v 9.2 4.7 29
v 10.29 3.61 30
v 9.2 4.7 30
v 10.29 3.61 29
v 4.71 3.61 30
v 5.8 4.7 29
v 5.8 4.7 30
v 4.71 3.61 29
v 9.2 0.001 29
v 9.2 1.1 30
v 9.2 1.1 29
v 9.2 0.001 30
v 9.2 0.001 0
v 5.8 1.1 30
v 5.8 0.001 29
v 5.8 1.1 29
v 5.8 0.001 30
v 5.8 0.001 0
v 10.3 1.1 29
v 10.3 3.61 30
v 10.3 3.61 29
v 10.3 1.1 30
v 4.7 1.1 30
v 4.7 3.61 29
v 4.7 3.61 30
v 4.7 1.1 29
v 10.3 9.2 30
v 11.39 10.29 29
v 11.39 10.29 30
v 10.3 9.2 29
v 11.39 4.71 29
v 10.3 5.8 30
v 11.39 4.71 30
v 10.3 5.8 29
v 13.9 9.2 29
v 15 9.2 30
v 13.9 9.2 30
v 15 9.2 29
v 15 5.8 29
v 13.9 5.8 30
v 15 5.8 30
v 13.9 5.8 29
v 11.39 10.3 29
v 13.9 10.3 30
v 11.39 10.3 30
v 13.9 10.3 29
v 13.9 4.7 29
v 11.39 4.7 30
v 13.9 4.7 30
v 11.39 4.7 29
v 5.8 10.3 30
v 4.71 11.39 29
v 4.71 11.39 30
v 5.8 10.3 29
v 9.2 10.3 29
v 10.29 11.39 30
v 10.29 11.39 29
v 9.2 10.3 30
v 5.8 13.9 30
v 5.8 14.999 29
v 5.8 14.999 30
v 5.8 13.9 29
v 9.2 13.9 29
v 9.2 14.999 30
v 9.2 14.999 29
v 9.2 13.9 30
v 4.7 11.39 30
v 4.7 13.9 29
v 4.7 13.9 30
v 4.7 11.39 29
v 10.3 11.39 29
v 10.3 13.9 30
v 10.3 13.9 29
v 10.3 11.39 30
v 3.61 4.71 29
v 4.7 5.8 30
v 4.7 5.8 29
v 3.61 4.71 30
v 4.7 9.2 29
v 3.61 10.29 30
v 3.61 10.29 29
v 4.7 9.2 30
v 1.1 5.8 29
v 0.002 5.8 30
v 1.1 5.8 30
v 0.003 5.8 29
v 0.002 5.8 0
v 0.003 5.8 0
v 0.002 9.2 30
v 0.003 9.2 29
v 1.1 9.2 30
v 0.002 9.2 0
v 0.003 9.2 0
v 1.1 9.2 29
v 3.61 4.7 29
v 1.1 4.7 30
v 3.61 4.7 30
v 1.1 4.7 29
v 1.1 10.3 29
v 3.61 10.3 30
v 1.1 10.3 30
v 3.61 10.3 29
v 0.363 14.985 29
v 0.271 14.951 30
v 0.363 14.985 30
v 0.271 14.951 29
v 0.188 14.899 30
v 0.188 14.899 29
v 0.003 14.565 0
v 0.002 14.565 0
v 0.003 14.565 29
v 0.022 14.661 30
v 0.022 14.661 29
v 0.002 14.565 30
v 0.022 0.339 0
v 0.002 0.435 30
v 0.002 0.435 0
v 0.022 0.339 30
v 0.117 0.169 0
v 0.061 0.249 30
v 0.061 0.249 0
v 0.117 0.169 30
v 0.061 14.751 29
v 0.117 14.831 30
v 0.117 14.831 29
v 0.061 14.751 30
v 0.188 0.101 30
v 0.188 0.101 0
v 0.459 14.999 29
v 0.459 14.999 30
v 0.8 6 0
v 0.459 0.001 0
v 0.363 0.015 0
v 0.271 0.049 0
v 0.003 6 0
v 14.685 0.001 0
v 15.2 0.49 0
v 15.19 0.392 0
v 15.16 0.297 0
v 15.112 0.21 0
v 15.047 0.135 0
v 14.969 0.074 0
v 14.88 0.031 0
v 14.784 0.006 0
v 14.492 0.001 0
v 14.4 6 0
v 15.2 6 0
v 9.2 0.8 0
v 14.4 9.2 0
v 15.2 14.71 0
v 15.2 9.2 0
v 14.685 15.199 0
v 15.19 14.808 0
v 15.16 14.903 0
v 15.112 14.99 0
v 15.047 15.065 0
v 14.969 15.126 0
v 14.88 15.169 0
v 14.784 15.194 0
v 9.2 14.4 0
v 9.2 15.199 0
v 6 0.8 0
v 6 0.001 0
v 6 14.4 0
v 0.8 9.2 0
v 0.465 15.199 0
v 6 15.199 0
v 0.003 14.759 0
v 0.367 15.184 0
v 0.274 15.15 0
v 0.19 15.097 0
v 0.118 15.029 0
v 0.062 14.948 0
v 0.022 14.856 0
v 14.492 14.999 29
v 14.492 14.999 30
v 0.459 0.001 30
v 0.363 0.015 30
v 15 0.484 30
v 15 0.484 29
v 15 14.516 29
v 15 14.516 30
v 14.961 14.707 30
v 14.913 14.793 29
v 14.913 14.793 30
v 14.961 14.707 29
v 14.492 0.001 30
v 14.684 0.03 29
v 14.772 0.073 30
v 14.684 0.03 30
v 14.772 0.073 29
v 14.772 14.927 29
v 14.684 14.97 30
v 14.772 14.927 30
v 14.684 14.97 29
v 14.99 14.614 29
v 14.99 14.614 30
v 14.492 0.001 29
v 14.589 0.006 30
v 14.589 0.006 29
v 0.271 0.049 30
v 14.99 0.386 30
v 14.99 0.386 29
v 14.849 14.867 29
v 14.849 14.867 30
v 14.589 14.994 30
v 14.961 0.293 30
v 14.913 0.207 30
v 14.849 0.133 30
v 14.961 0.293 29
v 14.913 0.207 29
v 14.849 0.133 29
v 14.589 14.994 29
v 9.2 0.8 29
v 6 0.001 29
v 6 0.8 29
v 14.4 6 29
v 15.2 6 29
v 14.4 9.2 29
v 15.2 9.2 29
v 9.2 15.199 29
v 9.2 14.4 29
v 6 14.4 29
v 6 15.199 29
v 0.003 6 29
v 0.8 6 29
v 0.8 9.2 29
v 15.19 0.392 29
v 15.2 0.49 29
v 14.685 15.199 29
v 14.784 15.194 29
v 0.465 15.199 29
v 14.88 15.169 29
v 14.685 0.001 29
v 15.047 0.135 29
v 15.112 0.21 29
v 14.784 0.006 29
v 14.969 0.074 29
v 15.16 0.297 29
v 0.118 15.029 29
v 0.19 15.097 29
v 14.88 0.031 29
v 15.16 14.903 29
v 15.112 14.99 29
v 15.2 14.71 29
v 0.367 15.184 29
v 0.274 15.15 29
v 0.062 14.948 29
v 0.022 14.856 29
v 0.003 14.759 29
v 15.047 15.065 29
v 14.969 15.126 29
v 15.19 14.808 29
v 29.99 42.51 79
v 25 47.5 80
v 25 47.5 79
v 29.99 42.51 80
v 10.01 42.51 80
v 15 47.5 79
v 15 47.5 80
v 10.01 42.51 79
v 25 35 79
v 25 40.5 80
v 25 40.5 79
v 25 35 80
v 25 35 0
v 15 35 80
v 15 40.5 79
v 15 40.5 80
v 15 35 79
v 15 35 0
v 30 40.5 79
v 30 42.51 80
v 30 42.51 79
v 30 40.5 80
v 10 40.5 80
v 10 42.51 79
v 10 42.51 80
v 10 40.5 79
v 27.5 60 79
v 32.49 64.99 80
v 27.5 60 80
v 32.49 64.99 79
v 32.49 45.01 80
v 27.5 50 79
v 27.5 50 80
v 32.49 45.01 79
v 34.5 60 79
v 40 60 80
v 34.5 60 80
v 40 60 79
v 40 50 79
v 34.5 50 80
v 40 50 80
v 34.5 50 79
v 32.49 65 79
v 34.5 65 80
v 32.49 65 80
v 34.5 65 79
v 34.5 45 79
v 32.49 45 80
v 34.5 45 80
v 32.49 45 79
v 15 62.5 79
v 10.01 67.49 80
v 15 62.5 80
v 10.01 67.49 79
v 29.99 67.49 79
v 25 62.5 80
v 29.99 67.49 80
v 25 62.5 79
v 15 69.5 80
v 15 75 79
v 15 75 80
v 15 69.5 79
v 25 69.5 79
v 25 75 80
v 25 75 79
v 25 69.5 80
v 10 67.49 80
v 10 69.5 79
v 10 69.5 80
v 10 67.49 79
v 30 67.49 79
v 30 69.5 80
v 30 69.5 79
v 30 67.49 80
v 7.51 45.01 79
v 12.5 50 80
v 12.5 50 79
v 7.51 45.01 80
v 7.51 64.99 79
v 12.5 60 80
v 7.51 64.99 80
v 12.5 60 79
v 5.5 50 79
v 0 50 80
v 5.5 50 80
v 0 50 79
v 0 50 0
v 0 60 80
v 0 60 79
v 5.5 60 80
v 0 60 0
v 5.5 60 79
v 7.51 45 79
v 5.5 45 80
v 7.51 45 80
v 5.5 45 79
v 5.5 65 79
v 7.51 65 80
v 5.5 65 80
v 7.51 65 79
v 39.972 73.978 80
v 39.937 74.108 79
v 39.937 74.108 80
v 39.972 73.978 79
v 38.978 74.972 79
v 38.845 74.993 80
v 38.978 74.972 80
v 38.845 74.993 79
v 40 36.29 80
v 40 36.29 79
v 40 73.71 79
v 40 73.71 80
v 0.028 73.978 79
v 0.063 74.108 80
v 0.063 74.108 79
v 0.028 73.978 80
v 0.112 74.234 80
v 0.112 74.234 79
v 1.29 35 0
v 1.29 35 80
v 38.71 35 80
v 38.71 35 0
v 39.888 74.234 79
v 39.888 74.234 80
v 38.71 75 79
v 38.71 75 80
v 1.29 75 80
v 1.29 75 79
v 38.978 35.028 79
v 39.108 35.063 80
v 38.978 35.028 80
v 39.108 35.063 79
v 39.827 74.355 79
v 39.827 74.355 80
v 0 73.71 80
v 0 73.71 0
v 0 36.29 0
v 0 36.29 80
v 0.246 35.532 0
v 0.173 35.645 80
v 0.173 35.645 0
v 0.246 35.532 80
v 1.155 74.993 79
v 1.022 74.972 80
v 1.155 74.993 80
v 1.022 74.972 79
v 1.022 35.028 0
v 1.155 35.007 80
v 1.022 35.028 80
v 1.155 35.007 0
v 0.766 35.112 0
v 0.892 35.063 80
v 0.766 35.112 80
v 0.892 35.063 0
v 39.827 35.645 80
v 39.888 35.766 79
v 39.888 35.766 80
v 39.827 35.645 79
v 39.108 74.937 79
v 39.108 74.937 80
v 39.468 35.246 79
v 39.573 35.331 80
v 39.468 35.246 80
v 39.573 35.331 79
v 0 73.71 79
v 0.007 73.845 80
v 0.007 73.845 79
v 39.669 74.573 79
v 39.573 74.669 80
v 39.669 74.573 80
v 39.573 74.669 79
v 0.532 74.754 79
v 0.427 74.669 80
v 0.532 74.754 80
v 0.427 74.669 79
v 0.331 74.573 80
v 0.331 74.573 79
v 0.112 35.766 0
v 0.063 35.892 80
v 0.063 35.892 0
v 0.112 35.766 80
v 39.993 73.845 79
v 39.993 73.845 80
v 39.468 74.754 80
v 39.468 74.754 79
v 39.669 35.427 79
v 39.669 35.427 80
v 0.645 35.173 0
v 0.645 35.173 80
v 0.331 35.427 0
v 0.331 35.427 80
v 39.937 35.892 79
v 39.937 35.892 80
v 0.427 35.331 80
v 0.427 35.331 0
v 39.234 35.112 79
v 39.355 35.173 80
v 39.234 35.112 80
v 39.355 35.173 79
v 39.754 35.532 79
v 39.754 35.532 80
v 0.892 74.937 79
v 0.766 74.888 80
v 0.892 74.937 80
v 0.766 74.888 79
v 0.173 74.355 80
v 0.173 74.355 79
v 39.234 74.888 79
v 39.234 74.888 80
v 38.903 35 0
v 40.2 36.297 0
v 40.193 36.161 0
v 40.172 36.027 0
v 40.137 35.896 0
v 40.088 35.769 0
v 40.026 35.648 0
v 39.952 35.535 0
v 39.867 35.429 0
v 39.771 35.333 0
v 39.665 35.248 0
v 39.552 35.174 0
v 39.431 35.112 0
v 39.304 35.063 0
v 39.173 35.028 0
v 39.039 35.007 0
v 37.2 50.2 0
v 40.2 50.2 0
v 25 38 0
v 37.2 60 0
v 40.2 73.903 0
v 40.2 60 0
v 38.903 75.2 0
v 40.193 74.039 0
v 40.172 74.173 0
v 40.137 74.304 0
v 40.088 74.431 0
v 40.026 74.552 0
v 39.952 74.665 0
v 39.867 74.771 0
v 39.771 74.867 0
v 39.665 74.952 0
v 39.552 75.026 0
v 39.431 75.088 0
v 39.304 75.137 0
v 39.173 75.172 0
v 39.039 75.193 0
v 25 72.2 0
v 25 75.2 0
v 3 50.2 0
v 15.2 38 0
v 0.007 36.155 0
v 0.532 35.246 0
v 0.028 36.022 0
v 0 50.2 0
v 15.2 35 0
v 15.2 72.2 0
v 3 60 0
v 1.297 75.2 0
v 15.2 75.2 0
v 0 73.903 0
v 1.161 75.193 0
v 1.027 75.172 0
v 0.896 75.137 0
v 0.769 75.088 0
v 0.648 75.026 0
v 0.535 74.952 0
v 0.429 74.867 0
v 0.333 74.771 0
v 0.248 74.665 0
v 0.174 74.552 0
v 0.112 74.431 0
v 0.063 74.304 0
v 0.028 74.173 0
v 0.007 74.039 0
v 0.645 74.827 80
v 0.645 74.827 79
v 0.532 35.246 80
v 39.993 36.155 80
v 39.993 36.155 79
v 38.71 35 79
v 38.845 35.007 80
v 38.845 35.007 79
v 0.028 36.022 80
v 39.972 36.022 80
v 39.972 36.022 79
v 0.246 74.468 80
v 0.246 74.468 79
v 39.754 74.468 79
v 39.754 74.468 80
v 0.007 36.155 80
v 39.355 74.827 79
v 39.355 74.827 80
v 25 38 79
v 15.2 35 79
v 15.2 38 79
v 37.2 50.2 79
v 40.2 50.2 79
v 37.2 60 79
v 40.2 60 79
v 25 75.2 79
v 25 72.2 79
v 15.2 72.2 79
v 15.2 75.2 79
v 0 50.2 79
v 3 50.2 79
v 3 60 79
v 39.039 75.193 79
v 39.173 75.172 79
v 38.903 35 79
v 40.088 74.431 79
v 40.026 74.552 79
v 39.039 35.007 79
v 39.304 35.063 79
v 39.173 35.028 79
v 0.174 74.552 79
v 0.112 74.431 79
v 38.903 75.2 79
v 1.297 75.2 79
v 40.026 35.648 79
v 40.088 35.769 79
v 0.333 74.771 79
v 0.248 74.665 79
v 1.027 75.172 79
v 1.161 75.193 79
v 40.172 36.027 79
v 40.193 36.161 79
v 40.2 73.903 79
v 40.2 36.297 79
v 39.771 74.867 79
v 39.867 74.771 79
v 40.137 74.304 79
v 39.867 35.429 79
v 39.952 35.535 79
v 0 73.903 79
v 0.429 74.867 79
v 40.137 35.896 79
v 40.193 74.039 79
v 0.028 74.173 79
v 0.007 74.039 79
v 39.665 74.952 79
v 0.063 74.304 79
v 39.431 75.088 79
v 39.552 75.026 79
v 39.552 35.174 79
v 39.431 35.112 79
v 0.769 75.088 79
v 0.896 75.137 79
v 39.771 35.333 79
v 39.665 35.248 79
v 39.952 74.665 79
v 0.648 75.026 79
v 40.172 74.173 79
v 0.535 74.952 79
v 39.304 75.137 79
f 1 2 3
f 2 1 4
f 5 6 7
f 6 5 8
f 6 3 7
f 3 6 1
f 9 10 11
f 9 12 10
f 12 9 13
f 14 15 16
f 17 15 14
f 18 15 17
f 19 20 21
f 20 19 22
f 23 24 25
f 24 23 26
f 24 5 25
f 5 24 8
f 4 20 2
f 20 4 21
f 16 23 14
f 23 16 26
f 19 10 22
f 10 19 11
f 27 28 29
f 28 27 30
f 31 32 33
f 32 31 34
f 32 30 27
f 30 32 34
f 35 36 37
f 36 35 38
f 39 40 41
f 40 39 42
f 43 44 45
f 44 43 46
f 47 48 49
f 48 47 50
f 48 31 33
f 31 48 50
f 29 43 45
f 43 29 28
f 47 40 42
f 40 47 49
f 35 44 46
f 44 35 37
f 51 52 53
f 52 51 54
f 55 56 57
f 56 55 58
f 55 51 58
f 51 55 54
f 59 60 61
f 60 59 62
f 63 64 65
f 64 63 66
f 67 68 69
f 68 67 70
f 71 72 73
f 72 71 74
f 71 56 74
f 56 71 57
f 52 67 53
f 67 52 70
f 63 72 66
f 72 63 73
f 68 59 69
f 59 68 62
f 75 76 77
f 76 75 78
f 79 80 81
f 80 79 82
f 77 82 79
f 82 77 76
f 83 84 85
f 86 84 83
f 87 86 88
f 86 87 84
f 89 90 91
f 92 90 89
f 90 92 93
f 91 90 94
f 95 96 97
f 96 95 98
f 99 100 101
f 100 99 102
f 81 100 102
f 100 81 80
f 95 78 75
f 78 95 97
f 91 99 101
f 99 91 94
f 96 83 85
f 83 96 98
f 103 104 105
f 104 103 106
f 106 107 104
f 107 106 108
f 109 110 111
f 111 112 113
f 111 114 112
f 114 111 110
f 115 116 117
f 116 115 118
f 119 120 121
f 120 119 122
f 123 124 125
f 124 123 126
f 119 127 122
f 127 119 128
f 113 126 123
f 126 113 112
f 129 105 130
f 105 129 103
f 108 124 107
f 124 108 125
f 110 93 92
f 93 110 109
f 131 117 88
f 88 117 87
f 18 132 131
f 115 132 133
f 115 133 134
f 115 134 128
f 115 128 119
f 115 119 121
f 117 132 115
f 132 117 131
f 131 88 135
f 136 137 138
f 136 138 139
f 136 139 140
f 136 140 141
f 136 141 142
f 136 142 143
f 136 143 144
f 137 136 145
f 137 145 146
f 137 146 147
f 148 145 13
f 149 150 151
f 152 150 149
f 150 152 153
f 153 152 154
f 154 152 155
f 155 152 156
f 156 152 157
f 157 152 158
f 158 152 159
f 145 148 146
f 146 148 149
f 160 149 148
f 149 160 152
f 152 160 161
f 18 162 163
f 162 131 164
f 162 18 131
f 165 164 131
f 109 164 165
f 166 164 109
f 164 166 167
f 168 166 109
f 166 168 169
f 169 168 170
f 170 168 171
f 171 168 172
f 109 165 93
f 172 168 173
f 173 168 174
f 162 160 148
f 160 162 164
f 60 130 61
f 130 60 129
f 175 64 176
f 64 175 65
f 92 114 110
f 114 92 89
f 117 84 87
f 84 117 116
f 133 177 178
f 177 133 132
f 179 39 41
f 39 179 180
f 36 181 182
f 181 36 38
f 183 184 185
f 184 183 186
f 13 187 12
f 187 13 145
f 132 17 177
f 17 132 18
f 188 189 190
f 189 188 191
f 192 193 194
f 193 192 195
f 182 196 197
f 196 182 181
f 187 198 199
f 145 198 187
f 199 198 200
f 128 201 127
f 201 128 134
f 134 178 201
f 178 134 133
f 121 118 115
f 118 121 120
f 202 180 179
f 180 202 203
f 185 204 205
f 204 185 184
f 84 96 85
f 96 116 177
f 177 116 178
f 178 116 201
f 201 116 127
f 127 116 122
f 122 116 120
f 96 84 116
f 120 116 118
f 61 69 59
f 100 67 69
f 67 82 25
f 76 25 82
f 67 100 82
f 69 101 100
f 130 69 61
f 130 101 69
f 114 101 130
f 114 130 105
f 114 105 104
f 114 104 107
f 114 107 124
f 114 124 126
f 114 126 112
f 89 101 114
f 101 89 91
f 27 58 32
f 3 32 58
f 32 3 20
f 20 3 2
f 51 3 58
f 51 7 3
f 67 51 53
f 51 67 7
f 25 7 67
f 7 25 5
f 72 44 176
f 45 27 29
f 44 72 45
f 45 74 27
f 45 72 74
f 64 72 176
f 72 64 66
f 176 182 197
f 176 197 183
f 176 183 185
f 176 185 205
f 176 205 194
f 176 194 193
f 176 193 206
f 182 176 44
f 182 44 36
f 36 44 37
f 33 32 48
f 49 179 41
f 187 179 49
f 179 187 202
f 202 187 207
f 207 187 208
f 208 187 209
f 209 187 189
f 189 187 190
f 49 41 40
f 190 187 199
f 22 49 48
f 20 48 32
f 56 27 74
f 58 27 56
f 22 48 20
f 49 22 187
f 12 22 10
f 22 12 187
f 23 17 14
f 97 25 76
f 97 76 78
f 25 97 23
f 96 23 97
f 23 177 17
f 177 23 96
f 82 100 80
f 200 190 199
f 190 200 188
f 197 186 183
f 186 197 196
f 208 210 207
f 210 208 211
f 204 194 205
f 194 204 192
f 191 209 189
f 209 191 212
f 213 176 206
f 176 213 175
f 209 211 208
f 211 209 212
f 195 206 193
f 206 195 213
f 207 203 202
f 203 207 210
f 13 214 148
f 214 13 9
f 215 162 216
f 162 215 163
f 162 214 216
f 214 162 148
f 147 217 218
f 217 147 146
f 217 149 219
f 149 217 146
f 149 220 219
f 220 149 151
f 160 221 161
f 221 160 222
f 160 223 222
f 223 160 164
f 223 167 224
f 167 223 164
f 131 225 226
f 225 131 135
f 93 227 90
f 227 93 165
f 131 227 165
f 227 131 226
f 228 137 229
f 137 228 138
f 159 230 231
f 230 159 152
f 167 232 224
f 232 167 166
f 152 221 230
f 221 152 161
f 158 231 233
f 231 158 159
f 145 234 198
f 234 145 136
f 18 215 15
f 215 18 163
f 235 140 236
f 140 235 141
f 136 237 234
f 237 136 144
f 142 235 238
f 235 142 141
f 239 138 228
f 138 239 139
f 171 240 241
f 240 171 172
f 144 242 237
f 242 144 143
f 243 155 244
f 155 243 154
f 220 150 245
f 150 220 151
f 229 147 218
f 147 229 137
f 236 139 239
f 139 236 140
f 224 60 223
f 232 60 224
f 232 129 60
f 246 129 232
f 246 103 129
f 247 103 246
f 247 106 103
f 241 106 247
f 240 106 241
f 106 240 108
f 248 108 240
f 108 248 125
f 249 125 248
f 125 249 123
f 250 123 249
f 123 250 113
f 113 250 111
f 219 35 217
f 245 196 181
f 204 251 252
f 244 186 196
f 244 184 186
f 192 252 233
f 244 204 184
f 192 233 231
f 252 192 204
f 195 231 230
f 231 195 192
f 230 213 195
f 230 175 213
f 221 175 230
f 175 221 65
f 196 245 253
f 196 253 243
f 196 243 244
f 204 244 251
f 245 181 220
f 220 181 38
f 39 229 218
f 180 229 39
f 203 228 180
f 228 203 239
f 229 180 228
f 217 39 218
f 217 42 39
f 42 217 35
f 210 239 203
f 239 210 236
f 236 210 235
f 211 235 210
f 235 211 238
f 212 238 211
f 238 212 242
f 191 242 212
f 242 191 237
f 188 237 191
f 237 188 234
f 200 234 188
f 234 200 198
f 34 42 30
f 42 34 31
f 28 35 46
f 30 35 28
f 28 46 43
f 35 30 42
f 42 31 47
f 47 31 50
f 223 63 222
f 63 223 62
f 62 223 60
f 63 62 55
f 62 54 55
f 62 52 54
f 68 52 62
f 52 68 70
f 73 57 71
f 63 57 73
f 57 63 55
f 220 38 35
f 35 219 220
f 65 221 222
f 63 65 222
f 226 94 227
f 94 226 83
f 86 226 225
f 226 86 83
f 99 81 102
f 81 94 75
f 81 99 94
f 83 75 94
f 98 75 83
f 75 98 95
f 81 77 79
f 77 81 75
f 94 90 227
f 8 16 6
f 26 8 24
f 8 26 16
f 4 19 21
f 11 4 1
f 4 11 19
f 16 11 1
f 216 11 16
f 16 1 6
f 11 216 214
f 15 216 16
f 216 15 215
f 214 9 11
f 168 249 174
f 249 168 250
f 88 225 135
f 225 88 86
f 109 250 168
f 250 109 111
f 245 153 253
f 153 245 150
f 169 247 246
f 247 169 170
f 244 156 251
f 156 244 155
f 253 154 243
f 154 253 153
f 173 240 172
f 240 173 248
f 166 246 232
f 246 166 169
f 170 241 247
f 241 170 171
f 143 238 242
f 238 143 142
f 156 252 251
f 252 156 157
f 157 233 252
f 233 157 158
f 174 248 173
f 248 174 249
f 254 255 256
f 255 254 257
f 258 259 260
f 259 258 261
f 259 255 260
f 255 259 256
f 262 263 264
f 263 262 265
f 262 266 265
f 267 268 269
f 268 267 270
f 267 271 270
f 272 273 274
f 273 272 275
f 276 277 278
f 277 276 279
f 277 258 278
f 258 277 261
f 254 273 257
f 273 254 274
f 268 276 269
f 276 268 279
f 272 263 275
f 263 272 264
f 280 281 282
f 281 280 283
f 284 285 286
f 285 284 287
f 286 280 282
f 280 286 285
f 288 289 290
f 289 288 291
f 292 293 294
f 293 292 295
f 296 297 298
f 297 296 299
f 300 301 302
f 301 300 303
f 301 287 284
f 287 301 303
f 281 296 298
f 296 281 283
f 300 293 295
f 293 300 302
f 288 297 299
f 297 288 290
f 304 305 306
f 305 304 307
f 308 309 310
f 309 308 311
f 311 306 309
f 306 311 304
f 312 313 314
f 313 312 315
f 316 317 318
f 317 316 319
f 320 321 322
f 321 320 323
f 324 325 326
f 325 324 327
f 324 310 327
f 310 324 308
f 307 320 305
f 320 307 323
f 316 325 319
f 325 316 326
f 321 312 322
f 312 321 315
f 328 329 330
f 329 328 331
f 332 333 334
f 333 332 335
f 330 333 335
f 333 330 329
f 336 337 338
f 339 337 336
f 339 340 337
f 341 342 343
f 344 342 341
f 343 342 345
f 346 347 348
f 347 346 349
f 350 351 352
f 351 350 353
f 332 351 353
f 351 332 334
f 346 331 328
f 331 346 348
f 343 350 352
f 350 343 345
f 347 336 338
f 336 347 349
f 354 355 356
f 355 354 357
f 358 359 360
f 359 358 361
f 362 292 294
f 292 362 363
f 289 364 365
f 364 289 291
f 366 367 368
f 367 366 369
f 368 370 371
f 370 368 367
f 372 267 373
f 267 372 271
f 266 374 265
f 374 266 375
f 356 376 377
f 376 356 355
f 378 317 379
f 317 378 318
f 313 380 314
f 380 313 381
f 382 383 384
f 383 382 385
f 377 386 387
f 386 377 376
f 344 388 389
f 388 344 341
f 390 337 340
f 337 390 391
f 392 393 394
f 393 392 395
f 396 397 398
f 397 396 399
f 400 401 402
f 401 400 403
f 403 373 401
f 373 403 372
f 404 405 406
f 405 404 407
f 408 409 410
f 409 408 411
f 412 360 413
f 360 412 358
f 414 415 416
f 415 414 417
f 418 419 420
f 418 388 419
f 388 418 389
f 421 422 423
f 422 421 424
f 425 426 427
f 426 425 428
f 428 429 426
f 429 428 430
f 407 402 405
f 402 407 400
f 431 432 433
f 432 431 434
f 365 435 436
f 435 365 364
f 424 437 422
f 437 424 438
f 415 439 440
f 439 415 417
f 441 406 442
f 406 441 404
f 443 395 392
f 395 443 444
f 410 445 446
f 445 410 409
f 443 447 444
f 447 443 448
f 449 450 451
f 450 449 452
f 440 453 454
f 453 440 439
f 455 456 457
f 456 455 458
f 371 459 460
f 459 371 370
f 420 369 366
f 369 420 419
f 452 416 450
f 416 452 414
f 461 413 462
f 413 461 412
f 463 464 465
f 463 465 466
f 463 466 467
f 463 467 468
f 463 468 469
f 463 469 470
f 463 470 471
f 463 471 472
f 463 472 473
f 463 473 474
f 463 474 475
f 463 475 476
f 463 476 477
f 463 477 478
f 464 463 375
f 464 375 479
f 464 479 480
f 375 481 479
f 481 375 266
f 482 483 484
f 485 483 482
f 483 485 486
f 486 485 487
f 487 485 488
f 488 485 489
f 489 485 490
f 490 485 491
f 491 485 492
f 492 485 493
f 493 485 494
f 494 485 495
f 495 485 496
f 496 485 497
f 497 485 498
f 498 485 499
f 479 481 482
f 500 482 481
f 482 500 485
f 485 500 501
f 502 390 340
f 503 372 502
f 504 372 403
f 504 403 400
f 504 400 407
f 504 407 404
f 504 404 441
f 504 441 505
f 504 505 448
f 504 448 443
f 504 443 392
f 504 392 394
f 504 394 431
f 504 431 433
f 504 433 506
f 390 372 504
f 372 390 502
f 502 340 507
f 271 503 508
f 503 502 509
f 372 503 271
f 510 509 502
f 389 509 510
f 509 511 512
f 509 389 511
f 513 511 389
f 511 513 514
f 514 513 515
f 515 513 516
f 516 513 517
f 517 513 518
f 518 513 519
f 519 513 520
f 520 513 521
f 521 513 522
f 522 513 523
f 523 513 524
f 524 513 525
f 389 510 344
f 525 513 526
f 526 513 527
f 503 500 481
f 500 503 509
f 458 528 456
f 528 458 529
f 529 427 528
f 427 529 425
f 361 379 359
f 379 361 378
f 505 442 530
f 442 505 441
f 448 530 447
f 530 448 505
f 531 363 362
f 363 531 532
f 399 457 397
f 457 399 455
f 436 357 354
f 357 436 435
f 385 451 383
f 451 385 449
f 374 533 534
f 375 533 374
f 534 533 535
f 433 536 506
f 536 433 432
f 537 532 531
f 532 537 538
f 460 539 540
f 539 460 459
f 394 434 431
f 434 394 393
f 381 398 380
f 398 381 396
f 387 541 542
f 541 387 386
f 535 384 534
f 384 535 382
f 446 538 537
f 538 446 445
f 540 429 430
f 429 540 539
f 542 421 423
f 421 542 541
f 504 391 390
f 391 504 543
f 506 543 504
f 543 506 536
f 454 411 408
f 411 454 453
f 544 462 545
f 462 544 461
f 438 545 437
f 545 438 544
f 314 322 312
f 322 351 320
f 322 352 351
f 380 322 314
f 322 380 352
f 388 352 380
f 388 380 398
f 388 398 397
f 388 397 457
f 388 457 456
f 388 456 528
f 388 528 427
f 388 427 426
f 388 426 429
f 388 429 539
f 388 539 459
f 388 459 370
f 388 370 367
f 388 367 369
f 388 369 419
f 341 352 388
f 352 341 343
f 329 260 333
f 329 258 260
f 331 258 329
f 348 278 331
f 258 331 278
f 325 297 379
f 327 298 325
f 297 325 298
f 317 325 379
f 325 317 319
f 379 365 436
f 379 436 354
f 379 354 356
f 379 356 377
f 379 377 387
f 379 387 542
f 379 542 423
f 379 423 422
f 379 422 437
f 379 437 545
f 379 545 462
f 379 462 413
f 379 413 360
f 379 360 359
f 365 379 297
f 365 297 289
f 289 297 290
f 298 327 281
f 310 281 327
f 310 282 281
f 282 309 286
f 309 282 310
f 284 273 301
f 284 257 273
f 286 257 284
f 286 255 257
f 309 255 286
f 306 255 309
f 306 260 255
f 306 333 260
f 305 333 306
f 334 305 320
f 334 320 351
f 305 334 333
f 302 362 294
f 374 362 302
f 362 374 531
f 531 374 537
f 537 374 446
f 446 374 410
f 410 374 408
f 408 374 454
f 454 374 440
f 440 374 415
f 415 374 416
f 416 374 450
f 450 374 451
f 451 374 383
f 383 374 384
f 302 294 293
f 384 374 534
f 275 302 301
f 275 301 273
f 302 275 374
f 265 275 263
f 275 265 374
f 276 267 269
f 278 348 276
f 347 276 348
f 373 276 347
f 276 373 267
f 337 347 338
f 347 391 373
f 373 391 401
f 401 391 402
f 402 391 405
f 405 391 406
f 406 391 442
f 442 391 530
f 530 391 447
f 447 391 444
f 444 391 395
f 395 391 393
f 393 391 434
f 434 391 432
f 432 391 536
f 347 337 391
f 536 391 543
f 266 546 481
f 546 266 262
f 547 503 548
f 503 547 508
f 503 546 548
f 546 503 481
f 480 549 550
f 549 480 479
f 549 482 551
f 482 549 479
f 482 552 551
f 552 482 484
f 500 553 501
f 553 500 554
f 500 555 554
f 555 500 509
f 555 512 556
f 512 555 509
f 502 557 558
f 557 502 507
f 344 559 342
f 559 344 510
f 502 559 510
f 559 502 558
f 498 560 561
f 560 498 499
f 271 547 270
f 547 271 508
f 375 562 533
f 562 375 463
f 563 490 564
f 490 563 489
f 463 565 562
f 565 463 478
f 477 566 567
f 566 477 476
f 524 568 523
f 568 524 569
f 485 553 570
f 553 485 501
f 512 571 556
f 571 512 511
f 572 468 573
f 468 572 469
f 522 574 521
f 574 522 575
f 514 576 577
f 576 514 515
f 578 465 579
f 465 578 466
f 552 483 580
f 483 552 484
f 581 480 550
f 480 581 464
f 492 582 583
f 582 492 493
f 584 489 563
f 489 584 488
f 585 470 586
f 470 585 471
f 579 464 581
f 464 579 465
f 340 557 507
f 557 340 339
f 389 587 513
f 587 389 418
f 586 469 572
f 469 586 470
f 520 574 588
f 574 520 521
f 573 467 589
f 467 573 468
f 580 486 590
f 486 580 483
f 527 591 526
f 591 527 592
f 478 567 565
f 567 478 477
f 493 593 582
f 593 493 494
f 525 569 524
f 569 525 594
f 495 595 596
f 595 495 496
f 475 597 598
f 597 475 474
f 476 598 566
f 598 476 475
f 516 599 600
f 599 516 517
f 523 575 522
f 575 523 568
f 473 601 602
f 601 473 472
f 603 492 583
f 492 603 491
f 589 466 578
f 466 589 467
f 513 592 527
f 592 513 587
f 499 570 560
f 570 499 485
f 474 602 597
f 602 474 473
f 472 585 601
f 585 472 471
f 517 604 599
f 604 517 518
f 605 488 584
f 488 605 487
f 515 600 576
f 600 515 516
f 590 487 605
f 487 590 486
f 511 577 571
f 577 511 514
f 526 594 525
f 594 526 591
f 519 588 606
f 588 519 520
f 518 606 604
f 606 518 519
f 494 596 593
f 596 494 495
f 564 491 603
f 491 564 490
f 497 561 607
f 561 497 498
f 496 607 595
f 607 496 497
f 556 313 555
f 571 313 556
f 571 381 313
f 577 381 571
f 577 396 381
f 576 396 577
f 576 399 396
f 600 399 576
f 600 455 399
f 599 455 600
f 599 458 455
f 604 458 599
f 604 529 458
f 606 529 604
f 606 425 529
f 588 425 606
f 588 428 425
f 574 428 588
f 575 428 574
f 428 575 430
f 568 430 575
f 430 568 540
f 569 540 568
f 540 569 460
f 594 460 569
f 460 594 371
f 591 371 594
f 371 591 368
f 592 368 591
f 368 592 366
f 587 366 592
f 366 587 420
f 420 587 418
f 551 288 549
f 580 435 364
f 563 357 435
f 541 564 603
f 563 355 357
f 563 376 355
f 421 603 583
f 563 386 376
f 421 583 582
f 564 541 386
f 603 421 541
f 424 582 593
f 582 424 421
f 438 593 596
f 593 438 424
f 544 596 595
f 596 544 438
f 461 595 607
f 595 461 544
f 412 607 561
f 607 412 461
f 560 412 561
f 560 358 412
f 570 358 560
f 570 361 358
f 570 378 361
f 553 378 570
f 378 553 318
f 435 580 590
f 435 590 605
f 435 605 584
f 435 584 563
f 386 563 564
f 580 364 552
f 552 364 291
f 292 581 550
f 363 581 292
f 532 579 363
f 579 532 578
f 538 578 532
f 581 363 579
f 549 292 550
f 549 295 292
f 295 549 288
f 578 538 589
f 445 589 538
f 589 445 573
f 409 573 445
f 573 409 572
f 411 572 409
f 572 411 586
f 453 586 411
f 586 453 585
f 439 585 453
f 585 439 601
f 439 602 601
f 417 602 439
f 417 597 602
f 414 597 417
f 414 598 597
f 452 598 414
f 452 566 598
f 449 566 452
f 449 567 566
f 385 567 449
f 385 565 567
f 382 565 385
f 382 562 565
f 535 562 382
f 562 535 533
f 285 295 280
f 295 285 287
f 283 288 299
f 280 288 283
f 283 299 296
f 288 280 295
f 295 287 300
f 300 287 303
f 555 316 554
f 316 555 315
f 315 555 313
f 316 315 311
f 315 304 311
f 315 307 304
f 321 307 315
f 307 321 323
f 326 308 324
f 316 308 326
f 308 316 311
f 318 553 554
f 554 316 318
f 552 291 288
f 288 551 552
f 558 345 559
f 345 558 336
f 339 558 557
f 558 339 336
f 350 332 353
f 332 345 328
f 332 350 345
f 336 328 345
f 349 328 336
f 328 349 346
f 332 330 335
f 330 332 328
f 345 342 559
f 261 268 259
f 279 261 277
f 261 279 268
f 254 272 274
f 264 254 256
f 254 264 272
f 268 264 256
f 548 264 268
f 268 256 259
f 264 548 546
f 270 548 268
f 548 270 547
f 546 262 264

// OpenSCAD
// file: regular polygon.scad
// Nathanael Lane
// 2015.1.22

use <triangle.scad>

/*
 * -r: radius (measured from center to flat, not center to corner)
 * -d: diameter (if both radius and diameter are specified, the used variable is undefined)
 * -ns: desired number of sides
 * -sl: desired minimum side length
 * -h: height of resulting prism
 * -center: whether or not to center resulting prism
 */
module regular_polygon(r = 0, d = 1, ns = 6, sl = 0.01, h = 1, center = false){
	
	function vo(r, fa) = r / cos(fa / 2);
	
	function fa(ns, r) = (ns > 3) && (sqrt(pow(vo(r = r, fa = 360 / ns), 2) - r * r) < sl / 2) ? 
		fa(ns = ns - 1, r = r) : 
		360 / ns;
	
	rd = (r == 0) ? d / 2 : r;
	
	a = fa(ns = ns, r = rd);
	
	vr = vo(r = rd, fa = a);

	if(a > 72){
	
		if(a > 90){
		
			translate([0, rd * 2, 0]){
			
				triangle(a = 60, d = rd * 3, h = h, center = center);
			}
		}else{
		
			rotate([0, 0, 45]){
			
				translate([0, 0, center ? 0 : h / 2]){
				
					cube([rd * 2, rd * 2, h], center = true);
				}
			}
		}
	}else{
	
		rotate([0, 0, 90]){
		
			cylinder(r = vr, h = h, center = center, $fa = a, $fs = sl);
		}
	}
}

regular_polygon(r = 10, h = 20);
// file: triangle.scad
// Nathanael Lane
// 2015.1.22


/*
 * -h: height of prism
 * -b: length of base
 * -d: base-to-apex distance
 * -s: side length
 * -a: angle of apex corner
 * -if more than two of b, d, s, and a are defined, the outcome is undefined
 */
module _triangle(b = 0, d = 0, s = 0, a = 0, base_origin = false){
	
	adBase = tan(a / 2) * d * 2;
	asBase = sin(a / 2) * s * 2;
	dsBase = sqrt((s * s) - (d * d));
	abHeight = (b / 2) / tan(a / 2);
	asHeight = cos(a / 2) * s;
	bsHeight = sqrt((s * s) - (b * b));

	baseLUT = [b, asBase, b, adBase, b, dsBase];
	heightLUT = [abHeight, asHeight, bsHeight, d, d, d];

	base = baseLUT[
		min((sign(b) + sign(s) * 2 + sign(d) * 4) - 1, 5)
	];
	height = heightLUT[
		min((sign(b) + sign(s) * 2 + sign(d) * 4) - 1, 5)
	];

	translate([0, base_origin ? height : 0, 0])
			polygon([
				[0, 0], 
				[base / 2, -height], 
				[-base / 2, -height]
			]);	
}

module triangle(h = 1, b = 0, d = 0, s = 0, a = 0, base_origin = false, center = false){

	translate([0, 0, center ? -h /2 : 0])
		linear_extrude(height = h)
			_triangle(b = b, d = d, s = s, a = a, base_origin = base_origin);	
}


$fa = 5;
$fs = 0.05;

triangle(h = 3, b = 10, a = 60, baseOrigin = true, center = true);
// file: complex primitives.scad
// Nathanael Lane
// 2015.3.17

use <triangle.scad>

module _square(xyz, cr, center = false){

	hull()
		translate(center ? [0, 0, 0] : xyz / 2)
			for(x = [-1, 1])
				for(y = [-1, 1])
					translate([(xyz[0] / 2 - cr) * x, (xyz[1] / 2 - cr) * y, 0])
						children();
}


module chamfered_square(xyz = [2, 2, 2], cr = 1, center){

	_square(xyz = xyz, cr = cr, center = center)
		rotate([0, 0, 45])
			cube([cr * sqrt(2), cr * sqrt(2), xyz[2]], center = true);
}


module rounded_square(xyz = [2, 2, 2], cr = 1, center){

	_square(xyz = xyz, cr = cr, center = center)
		cylinder(r = cr, h = xyz[2], center = true);
}


module _cube(xyz, cr, center = false){

	hull()
		translate(center ? [0, 0, 0] : xyz / 2)
			for(x = [-1, 1])
				for(y = [-1, 1])
					for(z = [-1, 1])
						translate([(xyz[0] / 2 - cr) * x, (xyz[1] / 2 - cr) * y, (xyz[2] / 2 - cr) * z])
							children();

}


module chamfered_cube(xyz = [2, 2, 2], cr = 1, center){

	p = [
		[0, 0, cr],
		[0, cr, 0],
		[cr, 0, 0],
		[0, -cr, 0],
		[-cr, 0, 0],
		[0, 0, -cr]
	];

	t = [
		[0, 1, 2],
		[0, 2, 3],
		[0, 3, 4],
		[0, 4, 1],

		[5, 2, 1],
		[5, 1, 4],
		[5, 4, 3],
		[5, 3, 2]
	];

	_cube(xyz = xyz, cr = cr, center = center)
		polyhedron(points = p, faces = t, convexity = 2);
}


module rounded_cube(xyz = [2, 2, 2], cr = 1, center){

	_cube(xyz = xyz, cr = cr, center = center)
		sphere(r = cr);
}


module _cylinder(h, d, r, cr, center = false){

	_r = (d == 0) ? r : d / 2;

	hull()
		translate([0, 0, center ? 0 : h / 2])
			for(a = [0, 180])
				rotate([a, 0, 0])
					translate([0, 0, h / 2 - cr])
						rotate_extrude()
							translate([_r - cr, 0, 0])
								children();
}


module chamfered_cylinder(h = 4, d = 0, r = 2, cr = 1, center){

	

	_cylinder(h = h, cr = cr, r = r, d = d, center = center)
		rotate([0, 0, 135])
			_triangle(s = cr, a = 90);
}


module rounded_cylinder(h = 4, d = 0, r = 3, cr = 1, center){

	_cylinder(h = h, d = d, r = r, cr = cr, center = center)
		intersection(){
		
			square([cr, cr]);
		
			circle(r = cr);
		}
}


module chamfer(cr = 1, l = 3, center = false){

	
	intersection(){

		rotate([0, -45, 0])
			translate([-cr * 3, center ? -l / 2 : 0, -cr * 3])
				chamfered_square([cr * 4, l, cr * 6], cr = cr);

		translate([-cr, center ? -l / 2 : 0, -cr])
			cube([cr * 4, l, cr * 4]);
	}
}

module sexy_cube(xyz = [3, 3, 3], cr = 1, fr = 1, center = false){

	translate(!center ? xyz / 2 : [0, 0, 0])
		hull()
			for(x = [-1, 1])
				for(y = [-1, 1])
					translate([x * (xyz[0] / 2 - fr), y * (xyz[1] / 2 - fr), 0])
						chamfered_cylinder(h = xyz[2], center = true, cr = cr, r = fr);
}


*sexy_cube([20, 40, 30], cr = 3, fr = 14);

chamfer(l = 20);

*rounded_square([5, 5, 5]);

$fa = 6;
$fs = 0.1;
// main file
// Nathanael Lane
// 2015.1.22

use <complex primitives.scad>
use <triangle.scad>
use <regular polygon.scad>

module aluminum_extrusion(w = 15, l = 5, subtractive = false, center = false, fit = 0.2){
	
	module draw(lw, lh, tw, th, sh, d){
	
		width = subtractive ? w + fit : w;
		
		ctr = center ? [0, 0, 0] : [width / 2, width / 2, 0];

		translate(ctr){
	
			difference(){
		
				translate([-width / 2, -width / 2, 0]){
		
					rounded_square([width, width, l], cr = width / 31);
				}
			
				for(a = [0:90:270]){
		
					rotate([0, 0, a]){
			
						translate([0, -(width / 2 + 1), -1]){
				
							if(subtractive){
						
								translate([(lw - fit) / -2, 0, 0]){
							
									cube([lw - fit, d + 1, l + 2]);
								}
							}else{
					
								t_slot(
									l = l + 2, 
									lw = lw, 
									lh = lh + 1, 
									tw = tw, 
									th = th,
									sh = sh
								);
							}
						}
					}
				}
			}
		}
	}


	if(w == 15){
	
		draw(
			l = l, 
			w = w, 
			lw = 3.4, 
			lh = 1.1, 
			tw = 5.6, 
			th = 2.5, 
			sh = 1.1, 
			d = 0.8
		);
	}else{
	
		if(w == 40){
		
			draw(
				l = l, 
				w = w, 
				lw = 10, 
				lh = 5.5, 
				tw = 20, 
				th = 2, 
				sh = 5, 
				d = 3
			);
		}else{
		
			echo(str("aluminum extrusion: value for w is NYI: ", w));
		}
	}
}


module t_slot(lw, lh, tw, th, sh, l){

	union(){
	
		//lip
		translate([lw / -2, 0, 0]){
		
			cube([lw, lh + 0.01, l]);
		}
		
		//t
		translate([tw / -2, lh, 0]){
		
			cube([tw, th + 0.01, l]);		
		}	
		
		//slope
		translate([0, lh + th, 0]){
		
			intersection(){
			
				triangle(a = 90, b = tw, h = l, base_origin = true);
				
				translate([-tw / 2, 0, 0]){
				
					cube([tw, sh, l]);
				}
			}
		}	
	}
}


/////testing/////
$fs = 0.05;
$fa = 5;

aluminum_extrusion(w = 15, l = 30);
aluminum_extrusion(w = 15, l = 29, subtractive = true);

translate([0, 35, 0]){
	aluminum_extrusion(w = 40, l = 80);
	aluminum_extrusion(w = 40, l = 79, subtractive = true);
}
